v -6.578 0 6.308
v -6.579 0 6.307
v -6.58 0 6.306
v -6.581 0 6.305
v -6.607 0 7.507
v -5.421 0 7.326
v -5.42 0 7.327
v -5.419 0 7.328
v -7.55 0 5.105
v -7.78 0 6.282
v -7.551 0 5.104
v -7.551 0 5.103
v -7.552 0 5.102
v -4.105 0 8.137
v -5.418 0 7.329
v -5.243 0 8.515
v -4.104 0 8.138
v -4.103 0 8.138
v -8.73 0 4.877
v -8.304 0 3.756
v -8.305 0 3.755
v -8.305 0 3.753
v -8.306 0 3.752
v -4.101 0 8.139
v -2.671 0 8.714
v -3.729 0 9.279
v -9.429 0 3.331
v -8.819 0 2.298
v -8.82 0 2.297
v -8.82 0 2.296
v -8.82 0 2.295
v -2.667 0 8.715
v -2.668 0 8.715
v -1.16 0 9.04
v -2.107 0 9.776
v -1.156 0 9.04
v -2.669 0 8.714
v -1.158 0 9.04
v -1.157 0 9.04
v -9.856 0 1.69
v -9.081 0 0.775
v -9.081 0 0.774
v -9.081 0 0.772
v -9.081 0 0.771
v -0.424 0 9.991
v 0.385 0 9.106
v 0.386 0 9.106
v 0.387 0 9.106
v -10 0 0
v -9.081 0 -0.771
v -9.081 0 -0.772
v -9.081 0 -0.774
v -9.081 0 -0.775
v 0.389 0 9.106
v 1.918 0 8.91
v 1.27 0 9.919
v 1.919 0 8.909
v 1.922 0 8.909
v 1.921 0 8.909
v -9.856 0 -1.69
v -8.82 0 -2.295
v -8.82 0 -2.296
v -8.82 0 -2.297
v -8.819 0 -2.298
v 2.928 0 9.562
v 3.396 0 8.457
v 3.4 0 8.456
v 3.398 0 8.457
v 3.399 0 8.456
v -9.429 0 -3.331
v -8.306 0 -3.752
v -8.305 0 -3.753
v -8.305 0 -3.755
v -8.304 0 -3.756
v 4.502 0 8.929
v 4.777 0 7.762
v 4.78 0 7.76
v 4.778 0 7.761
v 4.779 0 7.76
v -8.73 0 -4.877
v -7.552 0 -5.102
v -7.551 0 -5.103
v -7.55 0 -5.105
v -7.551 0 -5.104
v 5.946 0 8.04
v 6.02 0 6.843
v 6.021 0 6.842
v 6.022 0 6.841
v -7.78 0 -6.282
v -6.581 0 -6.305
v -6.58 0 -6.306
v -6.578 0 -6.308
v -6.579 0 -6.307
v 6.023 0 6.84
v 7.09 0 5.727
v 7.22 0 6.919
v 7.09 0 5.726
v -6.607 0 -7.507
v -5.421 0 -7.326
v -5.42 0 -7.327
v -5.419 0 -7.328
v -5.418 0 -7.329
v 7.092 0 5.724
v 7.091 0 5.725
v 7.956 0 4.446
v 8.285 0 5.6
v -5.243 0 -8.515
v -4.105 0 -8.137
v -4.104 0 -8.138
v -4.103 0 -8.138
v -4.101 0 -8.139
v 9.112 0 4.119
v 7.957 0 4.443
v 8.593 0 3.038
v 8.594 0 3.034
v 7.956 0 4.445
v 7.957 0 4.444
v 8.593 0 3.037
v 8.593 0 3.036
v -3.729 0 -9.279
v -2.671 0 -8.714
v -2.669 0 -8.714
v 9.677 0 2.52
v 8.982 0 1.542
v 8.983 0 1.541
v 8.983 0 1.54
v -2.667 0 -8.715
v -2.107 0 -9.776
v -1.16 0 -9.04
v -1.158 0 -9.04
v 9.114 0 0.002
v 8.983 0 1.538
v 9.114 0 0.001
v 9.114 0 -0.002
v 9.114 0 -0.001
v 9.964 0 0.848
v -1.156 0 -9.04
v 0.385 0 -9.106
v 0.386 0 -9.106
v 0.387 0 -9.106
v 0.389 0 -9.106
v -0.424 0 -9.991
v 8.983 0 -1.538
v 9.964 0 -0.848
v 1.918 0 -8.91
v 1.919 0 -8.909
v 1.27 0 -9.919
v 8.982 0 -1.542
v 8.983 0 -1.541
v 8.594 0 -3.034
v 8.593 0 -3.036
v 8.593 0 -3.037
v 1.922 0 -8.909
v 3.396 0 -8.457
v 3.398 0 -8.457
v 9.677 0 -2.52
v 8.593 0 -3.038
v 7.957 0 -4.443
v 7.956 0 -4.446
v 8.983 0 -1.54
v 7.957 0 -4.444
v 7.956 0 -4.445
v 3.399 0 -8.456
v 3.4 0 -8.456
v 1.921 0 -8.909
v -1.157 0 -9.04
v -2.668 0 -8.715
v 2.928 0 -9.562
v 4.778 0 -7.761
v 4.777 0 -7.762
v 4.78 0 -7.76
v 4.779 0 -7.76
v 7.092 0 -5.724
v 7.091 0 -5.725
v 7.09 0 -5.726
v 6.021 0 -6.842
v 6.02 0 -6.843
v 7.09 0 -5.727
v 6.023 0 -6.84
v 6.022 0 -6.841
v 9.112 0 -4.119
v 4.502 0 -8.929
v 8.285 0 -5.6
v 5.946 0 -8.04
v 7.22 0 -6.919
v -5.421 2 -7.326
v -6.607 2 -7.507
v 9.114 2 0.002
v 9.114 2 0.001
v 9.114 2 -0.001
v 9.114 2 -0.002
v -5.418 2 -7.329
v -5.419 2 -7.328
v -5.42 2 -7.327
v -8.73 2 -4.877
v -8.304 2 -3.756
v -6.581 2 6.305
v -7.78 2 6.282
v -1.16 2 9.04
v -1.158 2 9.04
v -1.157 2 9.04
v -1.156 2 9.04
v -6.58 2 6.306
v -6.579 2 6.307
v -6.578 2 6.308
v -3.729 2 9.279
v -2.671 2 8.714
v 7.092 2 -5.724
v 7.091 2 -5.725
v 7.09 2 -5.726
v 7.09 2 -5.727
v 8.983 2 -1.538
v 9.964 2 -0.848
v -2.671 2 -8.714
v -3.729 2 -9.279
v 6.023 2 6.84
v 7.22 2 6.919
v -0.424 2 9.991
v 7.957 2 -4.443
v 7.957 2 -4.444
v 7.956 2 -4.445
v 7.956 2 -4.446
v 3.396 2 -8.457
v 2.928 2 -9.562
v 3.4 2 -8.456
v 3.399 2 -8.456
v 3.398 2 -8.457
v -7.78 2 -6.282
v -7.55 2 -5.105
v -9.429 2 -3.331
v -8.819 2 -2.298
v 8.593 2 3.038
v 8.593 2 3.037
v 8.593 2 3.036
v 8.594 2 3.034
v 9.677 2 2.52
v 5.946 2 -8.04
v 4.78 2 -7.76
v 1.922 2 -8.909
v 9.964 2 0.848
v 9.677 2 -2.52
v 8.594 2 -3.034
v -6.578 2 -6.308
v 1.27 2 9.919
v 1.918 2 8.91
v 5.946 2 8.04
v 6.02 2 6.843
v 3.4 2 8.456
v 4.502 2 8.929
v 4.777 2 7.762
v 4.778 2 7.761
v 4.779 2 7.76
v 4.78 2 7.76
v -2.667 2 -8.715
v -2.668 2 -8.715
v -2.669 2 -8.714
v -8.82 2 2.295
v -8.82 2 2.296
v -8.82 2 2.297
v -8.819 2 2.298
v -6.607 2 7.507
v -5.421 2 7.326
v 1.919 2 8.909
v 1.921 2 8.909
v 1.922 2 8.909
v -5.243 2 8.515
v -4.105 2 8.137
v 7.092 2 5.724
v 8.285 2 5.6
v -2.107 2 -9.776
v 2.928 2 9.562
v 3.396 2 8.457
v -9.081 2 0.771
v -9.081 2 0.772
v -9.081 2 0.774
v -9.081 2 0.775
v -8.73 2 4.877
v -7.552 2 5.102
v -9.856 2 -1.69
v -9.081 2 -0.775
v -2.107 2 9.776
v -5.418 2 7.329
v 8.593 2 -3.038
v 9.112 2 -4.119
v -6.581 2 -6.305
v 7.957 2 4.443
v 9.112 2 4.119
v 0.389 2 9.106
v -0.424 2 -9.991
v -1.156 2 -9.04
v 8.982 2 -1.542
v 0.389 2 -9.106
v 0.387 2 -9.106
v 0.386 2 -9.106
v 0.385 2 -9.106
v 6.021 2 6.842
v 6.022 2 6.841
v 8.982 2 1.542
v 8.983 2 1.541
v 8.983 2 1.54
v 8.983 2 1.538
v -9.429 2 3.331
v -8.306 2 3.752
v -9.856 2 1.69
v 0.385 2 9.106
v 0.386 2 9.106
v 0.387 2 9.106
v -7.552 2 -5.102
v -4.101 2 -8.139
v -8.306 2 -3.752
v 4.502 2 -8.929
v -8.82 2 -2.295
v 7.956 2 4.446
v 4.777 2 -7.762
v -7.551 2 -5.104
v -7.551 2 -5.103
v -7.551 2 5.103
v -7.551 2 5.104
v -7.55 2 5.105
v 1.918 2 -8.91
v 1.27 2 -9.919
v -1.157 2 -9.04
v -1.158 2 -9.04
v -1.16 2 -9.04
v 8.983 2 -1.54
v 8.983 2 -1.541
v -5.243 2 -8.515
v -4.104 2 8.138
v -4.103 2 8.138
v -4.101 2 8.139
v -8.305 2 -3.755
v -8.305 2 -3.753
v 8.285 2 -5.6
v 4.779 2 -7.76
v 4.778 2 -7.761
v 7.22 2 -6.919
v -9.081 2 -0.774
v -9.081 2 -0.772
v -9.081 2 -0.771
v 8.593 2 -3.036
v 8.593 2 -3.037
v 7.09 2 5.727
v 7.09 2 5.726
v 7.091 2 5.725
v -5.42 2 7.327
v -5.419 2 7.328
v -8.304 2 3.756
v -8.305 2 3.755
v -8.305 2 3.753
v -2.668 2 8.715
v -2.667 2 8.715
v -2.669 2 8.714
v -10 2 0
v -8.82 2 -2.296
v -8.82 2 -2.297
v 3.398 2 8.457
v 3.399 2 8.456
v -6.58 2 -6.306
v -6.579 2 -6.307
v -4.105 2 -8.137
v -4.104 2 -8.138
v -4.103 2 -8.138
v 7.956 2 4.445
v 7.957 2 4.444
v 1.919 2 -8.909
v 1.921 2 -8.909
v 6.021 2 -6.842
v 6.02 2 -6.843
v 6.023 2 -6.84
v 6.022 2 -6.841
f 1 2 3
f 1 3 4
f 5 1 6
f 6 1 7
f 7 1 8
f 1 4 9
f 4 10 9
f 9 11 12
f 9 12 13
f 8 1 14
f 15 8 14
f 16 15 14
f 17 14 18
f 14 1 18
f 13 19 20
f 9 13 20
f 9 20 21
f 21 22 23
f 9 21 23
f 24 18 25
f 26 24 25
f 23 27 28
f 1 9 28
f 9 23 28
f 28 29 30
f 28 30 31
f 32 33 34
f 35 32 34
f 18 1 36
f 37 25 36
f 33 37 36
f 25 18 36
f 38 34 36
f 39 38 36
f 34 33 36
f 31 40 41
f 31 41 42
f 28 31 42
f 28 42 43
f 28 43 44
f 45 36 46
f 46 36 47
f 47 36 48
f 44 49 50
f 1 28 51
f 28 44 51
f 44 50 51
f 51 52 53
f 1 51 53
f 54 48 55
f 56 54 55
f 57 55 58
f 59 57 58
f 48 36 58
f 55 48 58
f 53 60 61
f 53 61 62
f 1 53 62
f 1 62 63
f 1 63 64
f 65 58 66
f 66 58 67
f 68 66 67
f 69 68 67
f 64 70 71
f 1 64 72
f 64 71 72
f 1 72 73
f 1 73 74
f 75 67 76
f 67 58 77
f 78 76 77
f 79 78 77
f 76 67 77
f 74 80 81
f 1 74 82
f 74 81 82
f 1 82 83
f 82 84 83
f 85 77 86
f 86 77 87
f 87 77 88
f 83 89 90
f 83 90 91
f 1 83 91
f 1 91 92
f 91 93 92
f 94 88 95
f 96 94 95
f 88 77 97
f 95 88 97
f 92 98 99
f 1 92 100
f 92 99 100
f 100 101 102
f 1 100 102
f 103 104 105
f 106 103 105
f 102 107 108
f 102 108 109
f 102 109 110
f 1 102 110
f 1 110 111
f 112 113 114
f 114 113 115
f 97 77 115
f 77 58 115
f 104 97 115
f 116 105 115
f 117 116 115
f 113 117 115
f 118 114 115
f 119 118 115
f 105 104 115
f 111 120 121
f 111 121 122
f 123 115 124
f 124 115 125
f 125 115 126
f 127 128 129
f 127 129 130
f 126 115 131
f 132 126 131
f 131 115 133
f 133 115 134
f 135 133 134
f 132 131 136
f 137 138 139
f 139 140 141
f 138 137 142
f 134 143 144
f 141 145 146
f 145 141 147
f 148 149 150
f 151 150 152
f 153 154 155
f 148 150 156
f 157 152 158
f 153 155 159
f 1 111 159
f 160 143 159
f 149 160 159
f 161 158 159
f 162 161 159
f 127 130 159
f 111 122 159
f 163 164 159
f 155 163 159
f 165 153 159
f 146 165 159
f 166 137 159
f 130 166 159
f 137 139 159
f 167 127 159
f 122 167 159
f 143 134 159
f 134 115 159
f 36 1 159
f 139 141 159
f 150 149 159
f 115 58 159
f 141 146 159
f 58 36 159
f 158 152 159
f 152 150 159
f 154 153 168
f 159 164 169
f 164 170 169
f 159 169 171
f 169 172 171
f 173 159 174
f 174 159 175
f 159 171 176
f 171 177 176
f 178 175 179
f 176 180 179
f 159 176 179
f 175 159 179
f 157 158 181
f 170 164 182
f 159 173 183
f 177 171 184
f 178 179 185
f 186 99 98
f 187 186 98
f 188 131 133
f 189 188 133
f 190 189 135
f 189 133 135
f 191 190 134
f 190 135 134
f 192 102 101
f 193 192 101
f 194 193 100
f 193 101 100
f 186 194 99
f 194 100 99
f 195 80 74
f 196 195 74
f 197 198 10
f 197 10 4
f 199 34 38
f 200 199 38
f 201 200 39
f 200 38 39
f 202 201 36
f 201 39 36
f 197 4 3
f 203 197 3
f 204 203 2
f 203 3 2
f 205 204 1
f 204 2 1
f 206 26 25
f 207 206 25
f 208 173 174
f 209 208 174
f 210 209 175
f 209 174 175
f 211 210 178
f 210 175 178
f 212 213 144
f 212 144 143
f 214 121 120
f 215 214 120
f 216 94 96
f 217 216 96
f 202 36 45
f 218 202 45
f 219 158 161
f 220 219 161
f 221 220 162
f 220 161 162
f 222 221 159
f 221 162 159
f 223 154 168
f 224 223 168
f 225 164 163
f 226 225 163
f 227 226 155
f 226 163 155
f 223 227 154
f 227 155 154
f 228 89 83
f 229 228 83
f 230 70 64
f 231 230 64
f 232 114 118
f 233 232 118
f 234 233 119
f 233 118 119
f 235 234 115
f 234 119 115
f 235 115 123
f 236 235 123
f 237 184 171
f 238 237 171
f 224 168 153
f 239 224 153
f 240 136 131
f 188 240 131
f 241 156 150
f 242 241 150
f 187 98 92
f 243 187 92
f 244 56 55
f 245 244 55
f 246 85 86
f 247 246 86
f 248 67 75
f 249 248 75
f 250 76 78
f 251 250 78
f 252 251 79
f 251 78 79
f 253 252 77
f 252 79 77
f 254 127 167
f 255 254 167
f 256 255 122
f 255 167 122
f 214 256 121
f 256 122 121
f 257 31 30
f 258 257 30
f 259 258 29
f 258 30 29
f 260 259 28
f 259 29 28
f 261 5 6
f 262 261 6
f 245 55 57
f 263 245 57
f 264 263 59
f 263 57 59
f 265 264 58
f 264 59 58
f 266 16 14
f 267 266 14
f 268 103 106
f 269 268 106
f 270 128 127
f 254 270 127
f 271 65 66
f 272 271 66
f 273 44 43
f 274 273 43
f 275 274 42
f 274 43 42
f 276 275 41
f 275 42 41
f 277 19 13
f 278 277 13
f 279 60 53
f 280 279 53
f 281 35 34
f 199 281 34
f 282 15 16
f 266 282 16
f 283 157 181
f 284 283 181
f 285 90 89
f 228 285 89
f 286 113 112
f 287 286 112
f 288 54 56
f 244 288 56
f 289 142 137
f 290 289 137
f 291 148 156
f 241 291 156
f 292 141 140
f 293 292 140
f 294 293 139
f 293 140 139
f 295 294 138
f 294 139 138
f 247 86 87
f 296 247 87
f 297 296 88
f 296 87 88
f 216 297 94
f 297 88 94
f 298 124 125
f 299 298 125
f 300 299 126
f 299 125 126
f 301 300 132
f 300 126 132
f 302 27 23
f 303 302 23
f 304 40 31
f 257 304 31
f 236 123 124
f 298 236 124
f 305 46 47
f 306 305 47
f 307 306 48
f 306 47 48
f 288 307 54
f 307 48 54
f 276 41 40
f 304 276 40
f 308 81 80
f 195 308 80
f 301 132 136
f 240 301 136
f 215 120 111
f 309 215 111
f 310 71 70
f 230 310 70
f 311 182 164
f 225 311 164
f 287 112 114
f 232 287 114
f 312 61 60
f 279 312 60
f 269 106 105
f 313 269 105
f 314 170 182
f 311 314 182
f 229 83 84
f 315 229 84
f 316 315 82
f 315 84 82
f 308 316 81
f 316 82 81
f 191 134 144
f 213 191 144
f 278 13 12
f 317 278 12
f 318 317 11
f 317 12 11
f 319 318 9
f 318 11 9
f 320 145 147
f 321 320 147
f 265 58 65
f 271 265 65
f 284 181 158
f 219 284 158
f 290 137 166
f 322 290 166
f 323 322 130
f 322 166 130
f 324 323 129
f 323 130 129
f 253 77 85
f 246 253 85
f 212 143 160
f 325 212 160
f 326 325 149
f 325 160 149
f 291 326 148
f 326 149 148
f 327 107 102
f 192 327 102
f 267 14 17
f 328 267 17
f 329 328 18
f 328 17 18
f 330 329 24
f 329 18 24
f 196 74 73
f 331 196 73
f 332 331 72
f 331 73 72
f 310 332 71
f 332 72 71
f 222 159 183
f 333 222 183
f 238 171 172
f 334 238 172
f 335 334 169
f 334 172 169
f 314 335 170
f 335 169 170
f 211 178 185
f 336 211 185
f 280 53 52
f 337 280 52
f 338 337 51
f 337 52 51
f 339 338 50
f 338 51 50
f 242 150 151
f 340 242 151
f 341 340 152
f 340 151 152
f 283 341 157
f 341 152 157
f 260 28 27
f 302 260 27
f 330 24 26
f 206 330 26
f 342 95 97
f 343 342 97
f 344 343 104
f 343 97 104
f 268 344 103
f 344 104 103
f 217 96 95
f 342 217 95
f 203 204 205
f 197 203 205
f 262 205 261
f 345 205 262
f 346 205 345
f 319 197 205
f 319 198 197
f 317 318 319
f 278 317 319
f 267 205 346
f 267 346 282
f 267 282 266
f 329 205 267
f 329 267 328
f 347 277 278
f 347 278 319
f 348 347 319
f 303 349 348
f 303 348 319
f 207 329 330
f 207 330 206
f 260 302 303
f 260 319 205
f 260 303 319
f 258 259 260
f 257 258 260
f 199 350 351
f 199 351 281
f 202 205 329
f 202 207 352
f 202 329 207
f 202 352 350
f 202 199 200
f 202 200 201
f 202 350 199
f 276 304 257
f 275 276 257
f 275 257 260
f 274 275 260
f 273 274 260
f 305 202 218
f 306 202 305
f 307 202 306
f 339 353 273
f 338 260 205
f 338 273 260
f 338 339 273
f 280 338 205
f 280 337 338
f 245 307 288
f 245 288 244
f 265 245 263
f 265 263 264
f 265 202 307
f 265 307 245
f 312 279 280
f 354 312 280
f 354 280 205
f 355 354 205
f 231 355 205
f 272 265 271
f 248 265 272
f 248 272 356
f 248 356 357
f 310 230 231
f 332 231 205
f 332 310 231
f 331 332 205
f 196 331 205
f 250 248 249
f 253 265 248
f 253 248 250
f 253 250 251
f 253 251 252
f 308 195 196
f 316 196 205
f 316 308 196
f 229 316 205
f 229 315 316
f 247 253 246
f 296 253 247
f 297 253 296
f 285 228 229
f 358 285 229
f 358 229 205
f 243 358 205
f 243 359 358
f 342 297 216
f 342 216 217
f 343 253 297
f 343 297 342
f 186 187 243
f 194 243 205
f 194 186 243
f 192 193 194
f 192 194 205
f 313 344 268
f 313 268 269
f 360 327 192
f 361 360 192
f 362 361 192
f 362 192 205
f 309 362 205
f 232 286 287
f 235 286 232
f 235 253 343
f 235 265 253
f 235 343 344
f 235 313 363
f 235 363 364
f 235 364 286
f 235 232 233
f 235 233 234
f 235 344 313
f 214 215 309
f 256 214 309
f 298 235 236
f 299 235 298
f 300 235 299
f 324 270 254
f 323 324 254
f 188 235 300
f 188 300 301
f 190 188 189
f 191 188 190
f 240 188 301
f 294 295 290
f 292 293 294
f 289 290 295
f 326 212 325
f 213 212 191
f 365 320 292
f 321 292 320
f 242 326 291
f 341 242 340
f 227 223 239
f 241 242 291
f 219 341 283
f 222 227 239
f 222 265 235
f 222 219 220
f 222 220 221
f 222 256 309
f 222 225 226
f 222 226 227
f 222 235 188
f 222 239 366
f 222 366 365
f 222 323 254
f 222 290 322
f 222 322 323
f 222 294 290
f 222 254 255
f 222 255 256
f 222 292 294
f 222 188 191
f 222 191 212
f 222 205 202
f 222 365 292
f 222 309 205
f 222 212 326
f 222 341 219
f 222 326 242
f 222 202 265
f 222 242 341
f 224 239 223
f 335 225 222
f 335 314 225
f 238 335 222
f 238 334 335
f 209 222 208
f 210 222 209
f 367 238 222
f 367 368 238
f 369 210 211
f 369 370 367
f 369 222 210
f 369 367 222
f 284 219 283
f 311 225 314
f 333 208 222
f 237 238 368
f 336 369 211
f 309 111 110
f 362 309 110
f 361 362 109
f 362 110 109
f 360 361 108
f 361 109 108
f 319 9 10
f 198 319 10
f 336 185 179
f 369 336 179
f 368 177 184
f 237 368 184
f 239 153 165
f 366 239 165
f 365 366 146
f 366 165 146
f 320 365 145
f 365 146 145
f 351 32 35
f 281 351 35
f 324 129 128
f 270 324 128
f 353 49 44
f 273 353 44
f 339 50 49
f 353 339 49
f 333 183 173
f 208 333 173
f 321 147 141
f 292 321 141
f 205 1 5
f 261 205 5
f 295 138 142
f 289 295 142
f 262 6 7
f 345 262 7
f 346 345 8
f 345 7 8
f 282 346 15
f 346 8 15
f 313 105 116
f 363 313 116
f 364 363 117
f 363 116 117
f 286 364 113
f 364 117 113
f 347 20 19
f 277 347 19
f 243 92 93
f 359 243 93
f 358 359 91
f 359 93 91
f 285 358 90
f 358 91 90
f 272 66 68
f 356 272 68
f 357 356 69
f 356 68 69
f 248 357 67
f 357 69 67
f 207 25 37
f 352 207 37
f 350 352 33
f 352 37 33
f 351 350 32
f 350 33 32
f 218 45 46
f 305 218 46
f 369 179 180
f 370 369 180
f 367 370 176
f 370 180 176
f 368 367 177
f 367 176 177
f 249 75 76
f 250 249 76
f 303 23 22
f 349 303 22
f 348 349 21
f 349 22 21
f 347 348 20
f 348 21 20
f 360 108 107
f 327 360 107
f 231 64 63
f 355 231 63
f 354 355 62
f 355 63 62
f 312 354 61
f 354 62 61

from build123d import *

# Parameters (mm, degrees)
BOSS_EXTRUDE2_DEPTH    = 2
BOSS_EXTRUDE2_2_DEPTH  = 2
BOSS_EXTRUDE2_3_DEPTH  = 2
BOSS_EXTRUDE2_4_DEPTH  = 2
BOSS_EXTRUDE2_5_DEPTH  = 2
BOSS_EXTRUDE2_6_DEPTH  = 2
BOSS_EXTRUDE2_7_DEPTH  = 2
BOSS_EXTRUDE2_8_DEPTH  = 2
BOSS_EXTRUDE2_9_DEPTH  = 2
BOSS_EXTRUDE2_10_DEPTH = 2
BOSS_EXTRUDE2_11_DEPTH = 2
BOSS_EXTRUDE2_12_DEPTH = 2
BOSS_EXTRUDE2_13_DEPTH = 2
BOSS_EXTRUDE2_14_DEPTH = 2
BOSS_EXTRUDE2_15_DEPTH = 2
BOSS_EXTRUDE2_16_DEPTH = 2
BOSS_EXTRUDE2_17_DEPTH = 2
BOSS_EXTRUDE2_18_DEPTH = 2
BOSS_EXTRUDE2_19_DEPTH = 2
BOSS_EXTRUDE2_20_DEPTH = 2
BOSS_EXTRUDE2_21_DEPTH = 2
BOSS_EXTRUDE2_22_DEPTH = 2
BOSS_EXTRUDE2_23_DEPTH = 2
BOSS_EXTRUDE2_24_DEPTH = 2
BOSS_EXTRUDE2_25_DEPTH = 2
BOSS_EXTRUDE2_26_DEPTH = 2
BOSS_EXTRUDE2_27_DEPTH = 2
BOSS_EXTRUDE2_28_DEPTH = 2
BOSS_EXTRUDE2_29_DEPTH = 2
BOSS_EXTRUDE2_30_DEPTH = 2
BOSS_EXTRUDE2_31_DEPTH = 2
BOSS_EXTRUDE2_32_DEPTH = 2
BOSS_EXTRUDE2_33_DEPTH = 2
BOSS_EXTRUDE2_34_DEPTH = 2
BOSS_EXTRUDE2_35_DEPTH = 2
BOSS_EXTRUDE2_36_DEPTH = 2
BOSS_EXTRUDE2_37_DEPTH = 2
SKETCH1_7_R            = 9.11382877
BOSS_EXTRUDE3_DEPTH    = 2


with BuildPart() as part:
    # Sketch1 → Boss-Extrude2 (new body)
    with BuildSketch(Plane(origin=(0, 0, 0), x_dir=(1, 0, 0), z_dir=(0, 1, 0))):
        with BuildLine():
            ThreePointArc((0.384889844, -9.105697923), (-0.386801859, -9.105616902), (-1.155720405, -9.040253602))
            Line((-1.155720405, -9.040253602), (-0.424412032, -9.990989662))
            Line((-0.424412032, -9.990989662), (0.384889844, -9.105697923))
        make_face()
    extrude(amount=BOSS_EXTRUDE2_DEPTH)



with BuildPart() as body_2:
    # Sketch1 → Boss-Extrude2 2 (new body)
    with BuildSketch(Plane(origin=(0, 0, 0), x_dir=(1, 0, 0), z_dir=(0, 1, 0))):
        with BuildLine():
            ThreePointArc((1.918223973, -8.909674048), (1.15761866, -9.040010724), (0.388713856, -9.105535481))
            Line((0.388713856, -9.105535481), (1.270178197, -9.919004353))
            Line((1.270178197, -9.919004353), (1.918223973, -8.909674048))
        make_face()
    extrude(amount=BOSS_EXTRUDE2_2_DEPTH)


with BuildPart() as body_3:
    # Sketch1 → Boss-Extrude2 3 (new body)
    with BuildSketch(Plane(origin=(0, 0, 0), x_dir=(1, 0, 0), z_dir=(0, 1, 0))):
        with BuildLine():
            ThreePointArc((3.39637429, -8.457335073), (2.668736597, -8.714339896), (1.921965527, -8.908867681))
            Line((1.921965527, -8.908867681), (2.928227713, -9.561667347))
            Line((2.928227713, -9.561667347), (3.39637429, -8.457335073))
        make_face()
    extrude(amount=BOSS_EXTRUDE2_3_DEPTH)


with BuildPart() as body_4:
    # Sketch1 → Boss-Extrude2 4 (new body)
    with BuildSketch(Plane(origin=(0, 0, 0), x_dir=(1, 0, 0), z_dir=(0, 1, 0))):
        with BuildLine():
            ThreePointArc((4.776817103, -7.761693966), (4.103079842, -8.137973376), (3.399925749, -8.455907979))
            Line((3.399925749, -8.455907979), (4.502037448, -8.929258581))
            Line((4.502037448, -8.929258581), (4.776817103, -7.761693966))
        make_face()
    extrude(amount=BOSS_EXTRUDE2_4_DEPTH)


with BuildPart() as body_5:
    # Sketch1 → Boss-Extrude2 5 (new body)
    with BuildSketch(Plane(origin=(0, 0, 0), x_dir=(1, 0, 0), z_dir=(0, 1, 0))):
        with BuildLine():
            ThreePointArc((6.019839585, -6.842763055), (5.41938495, -7.327492178), (4.780076297, -7.7596872))
            Line((4.780076297, -7.7596872), (5.946331763, -8.039971304))
            Line((5.946331763, -8.039971304), (6.019839585, -6.842763055))
        make_face()
    extrude(amount=BOSS_EXTRUDE2_5_DEPTH)


with BuildPart() as body_6:
    # Sketch1 → Boss-Extrude2 6 (new body)
    with BuildSketch(Plane(origin=(0, 0, 0), x_dir=(1, 0, 0), z_dir=(0, 1, 0))):
        with BuildLine():
            ThreePointArc((7.089682242, -5.72697831), (6.57978422, -6.306212371), (6.022712753, -6.840234349))
            Line((6.022712753, -6.840234349), (7.21956094, -6.91938869))
            Line((7.21956094, -6.91938869), (7.089682242, -5.72697831))
        make_face()
    extrude(amount=BOSS_EXTRUDE2_6_DEPTH)


with BuildPart() as body_7:
    # Sketch1 → Boss-Extrude2 7 (new body)
    with BuildSketch(Plane(origin=(0, 0, 0), x_dir=(1, 0, 0), z_dir=(0, 1, 0))):
        with BuildLine():
            ThreePointArc((7.955567649, -4.446438825), (7.550895078, -5.103514316), (7.092086729, -5.724000409))
            Line((7.092086729, -5.724000409), (8.285096492, -5.599747861))
            Line((8.285096492, -5.599747861), (7.955567649, -4.446438825))
        make_face()
    extrude(amount=BOSS_EXTRUDE2_7_DEPTH)


with BuildPart() as body_8:
    # Sketch1 → Boss-Extrude2 8 (new body)
    with BuildSketch(Plane(origin=(0, 0, 0), x_dir=(1, 0, 0), z_dir=(0, 1, 0))):
        with BuildLine():
            ThreePointArc((8.59258586, -3.037983392), (8.304780432, -3.753997447), (7.957434282, -4.443097399))
            Line((7.957434282, -4.443097399), (9.112284904, -4.119012482))
            Line((9.112284904, -4.119012482), (8.59258586, -3.037983392))
        make_face()
    extrude(amount=BOSS_EXTRUDE2_8_DEPTH)


with BuildPart() as body_9:
    # Sketch1 → Boss-Extrude2 9 (new body)
    with BuildSketch(Plane(origin=(0, 0, 0), x_dir=(1, 0, 0), z_dir=(0, 1, 0))):
        with BuildLine():
            ThreePointArc((8.98241102, -1.542130707), (8.819752374, -2.296484905), (8.593860939, -3.034374566))
            Line((8.593860939, -3.034374566), (9.677329469, -2.519780614))
            Line((9.677329469, -2.519780614), (8.98241102, -1.542130707))
        make_face()
    extrude(amount=BOSS_EXTRUDE2_9_DEPTH)


with BuildPart() as body_10:
    # Sketch1 → Boss-Extrude2 10 (new body)
    with BuildSketch(Plane(origin=(0, 0, 0), x_dir=(1, 0, 0), z_dir=(0, 1, 0))):
        with BuildLine():
            ThreePointArc((9.113828569, -0.00191373), (9.080996098, -0.772906674), (8.983057864, -1.538358302))
            Line((8.983057864, -1.538358302), (9.963974885, -0.848059245))
            Line((9.963974885, -0.848059245), (9.113828569, -0.00191373))
        make_face()
    extrude(amount=BOSS_EXTRUDE2_10_DEPTH)


with BuildPart() as body_11:
    # Sketch1 → Boss-Extrude2 11 (new body)
    with BuildSketch(Plane(origin=(0, 0, 0), x_dir=(1, 0, 0), z_dir=(0, 1, 0))):
        with BuildLine():
            Line((9.963974885, 0.848059245), (8.983057864, 1.538358302))
            ThreePointArc((8.983057864, 1.538358302), (9.080996098, 0.772906674), (9.113828569, 0.00191373))
            Line((9.113828569, 0.00191373), (9.963974885, 0.848059245))
        make_face()
    extrude(amount=BOSS_EXTRUDE2_11_DEPTH)


with BuildPart() as body_12:
    # Sketch1 → Boss-Extrude2 12 (new body)
    with BuildSketch(Plane(origin=(0, 0, 0), x_dir=(1, 0, 0), z_dir=(0, 1, 0))):
        with BuildLine():
            Line((9.677329469, 2.519780614), (8.593860939, 3.034374566))
            ThreePointArc((8.593860939, 3.034374566), (8.819752374, 2.296484905), (8.98241102, 1.542130707))
            Line((8.98241102, 1.542130707), (9.677329469, 2.519780614))
        make_face()
    extrude(amount=BOSS_EXTRUDE2_12_DEPTH)


with BuildPart() as body_13:
    # Sketch1 → Boss-Extrude2 13 (new body)
    with BuildSketch(Plane(origin=(0, 0, 0), x_dir=(1, 0, 0), z_dir=(0, 1, 0))):
        with BuildLine():
            Line((9.112284904, 4.119012482), (7.957434282, 4.443097399))
            ThreePointArc((7.957434282, 4.443097399), (8.304780432, 3.753997447), (8.59258586, 3.037983392))
            Line((8.59258586, 3.037983392), (9.112284904, 4.119012482))
        make_face()
    extrude(amount=BOSS_EXTRUDE2_13_DEPTH)


with BuildPart() as body_14:
    # Sketch1 → Boss-Extrude2 14 (new body)
    with BuildSketch(Plane(origin=(0, 0, 0), x_dir=(1, 0, 0), z_dir=(0, 1, 0))):
        with BuildLine():
            Line((8.285096492, 5.599747861), (7.092086729, 5.724000409))
            ThreePointArc((7.092086729, 5.724000409), (7.550895078, 5.103514316), (7.955567649, 4.446438825))
            Line((7.955567649, 4.446438825), (8.285096492, 5.599747861))
        make_face()
    extrude(amount=BOSS_EXTRUDE2_14_DEPTH)


with BuildPart() as body_15:
    # Sketch1 → Boss-Extrude2 15 (new body)
    with BuildSketch(Plane(origin=(0, 0, 0), x_dir=(1, 0, 0), z_dir=(0, 1, 0))):
        with BuildLine():
            Line((7.21956094, 6.91938869), (6.022712753, 6.840234349))
            ThreePointArc((6.022712753, 6.840234349), (6.57978422, 6.306212371), (7.089682242, 5.72697831))
            Line((7.089682242, 5.72697831), (7.21956094, 6.91938869))
        make_face()
    extrude(amount=BOSS_EXTRUDE2_15_DEPTH)


with BuildPart() as body_16:
    # Sketch1 → Boss-Extrude2 16 (new body)
    with BuildSketch(Plane(origin=(0, 0, 0), x_dir=(1, 0, 0), z_dir=(0, 1, 0))):
        with BuildLine():
            Line((5.946331763, 8.039971304), (4.780076297, 7.7596872))
            ThreePointArc((4.780076297, 7.7596872), (5.41938495, 7.327492178), (6.019839585, 6.842763055))
            Line((6.019839585, 6.842763055), (5.946331763, 8.039971304))
        make_face()
    extrude(amount=BOSS_EXTRUDE2_16_DEPTH)


with BuildPart() as body_17:
    # Sketch1 → Boss-Extrude2 17 (new body)
    with BuildSketch(Plane(origin=(0, 0, 0), x_dir=(1, 0, 0), z_dir=(0, 1, 0))):
        with BuildLine():
            Line((4.502037448, 8.929258581), (3.399925749, 8.455907979))
            ThreePointArc((3.399925749, 8.455907979), (4.103079842, 8.137973376), (4.776817103, 7.761693966))
            Line((4.776817103, 7.761693966), (4.502037448, 8.929258581))
        make_face()
    extrude(amount=BOSS_EXTRUDE2_17_DEPTH)


with BuildPart() as body_18:
    # Sketch1 → Boss-Extrude2 18 (new body)
    with BuildSketch(Plane(origin=(0, 0, 0), x_dir=(1, 0, 0), z_dir=(0, 1, 0))):
        with BuildLine():
            Line((2.928227713, 9.561667347), (1.921965527, 8.908867681))
            ThreePointArc((1.921965527, 8.908867681), (2.668736597, 8.714339896), (3.39637429, 8.457335073))
            Line((3.39637429, 8.457335073), (2.928227713, 9.561667347))
        make_face()
    extrude(amount=BOSS_EXTRUDE2_18_DEPTH)


with BuildPart() as body_19:
    # Sketch1 → Boss-Extrude2 19 (new body)
    with BuildSketch(Plane(origin=(0, 0, 0), x_dir=(1, 0, 0), z_dir=(0, 1, 0))):
        with BuildLine():
            Line((1.270178197, 9.919004353), (0.388713856, 9.105535481))
            ThreePointArc((0.388713856, 9.105535481), (1.15761866, 9.040010724), (1.918223973, 8.909674048))
            Line((1.918223973, 8.909674048), (1.270178197, 9.919004353))
        make_face()
    extrude(amount=BOSS_EXTRUDE2_19_DEPTH)


with BuildPart() as body_20:
    # Sketch1 → Boss-Extrude2 20 (new body)
    with BuildSketch(Plane(origin=(0, 0, 0), x_dir=(1, 0, 0), z_dir=(0, 1, 0))):
        with BuildLine():
            Line((-0.424412032, 9.990989662), (-1.155720405, 9.040253602))
            ThreePointArc((-1.155720405, 9.040253602), (-0.386801859, 9.105616902), (0.384889844, 9.105697923))
            Line((0.384889844, 9.105697923), (-0.424412032, 9.990989662))
        make_face()
    extrude(amount=BOSS_EXTRUDE2_20_DEPTH)


with BuildPart() as body_21:
    # Sketch1 → Boss-Extrude2 21 (new body)
    with BuildSketch(Plane(origin=(0, 0, 0), x_dir=(1, 0, 0), z_dir=(0, 1, 0))):
        with BuildLine():
            Line((-2.1067927, 9.775552389), (-2.666906693, 8.714900088))
            ThreePointArc((-2.666906693, 8.714900088), (-1.920094792, 8.909271061), (-1.159516864, 9.039767447))
            Line((-1.159516864, 9.039767447), (-2.1067927, 9.775552389))
        make_face()
    extrude(amount=BOSS_EXTRUDE2_21_DEPTH)


with BuildPart() as body_22:
    # Sketch1 → Boss-Extrude2 22 (new body)
    with BuildSketch(Plane(origin=(0, 0, 0), x_dir=(1, 0, 0), z_dir=(0, 1, 0))):
        with BuildLine():
            Line((-3.728564778, 9.278890273), (-4.101370932, 8.138834765))
            ThreePointArc((-4.101370932, 8.138834765), (-3.398150094, 8.456621712), (-2.670566384, 8.71377932))
            Line((-2.670566384, 8.71377932), (-3.728564778, 9.278890273))
        make_face()
    extrude(amount=BOSS_EXTRUDE2_22_DEPTH)


with BuildPart() as body_23:
    # Sketch1 → Boss-Extrude2 23 (new body)
    with BuildSketch(Plane(origin=(0, 0, 0), x_dir=(1, 0, 0), z_dir=(0, 1, 0))):
        with BuildLine():
            Line((-5.243072836, 8.515291377), (-5.417846197, 7.328629984))
            ThreePointArc((-5.417846197, 7.328629984), (-4.778446805, 7.760690754), (-4.104788571, 8.137111628))
            Line((-4.104788571, 8.137111628), (-5.243072836, 8.515291377))
        make_face()
    extrude(amount=BOSS_EXTRUDE2_23_DEPTH)


with BuildPart() as body_24:
    # Sketch1 → Boss-Extrude2 24 (new body)
    with BuildSketch(Plane(origin=(0, 0, 0), x_dir=(1, 0, 0), z_dir=(0, 1, 0))):
        with BuildLine():
            Line((-6.606747234, 7.506723053), (-6.57845989, 6.307593861))
            ThreePointArc((-6.57845989, 6.307593861), (-6.021276302, 6.841498853), (-5.420923464, 7.326354049))
            Line((-5.420923464, 7.326354049), (-6.606747234, 7.506723053))
        make_face()
    extrude(amount=BOSS_EXTRUDE2_24_DEPTH)


with BuildPart() as body_25:
    # Sketch1 → Boss-Extrude2 25 (new body)
    with BuildSketch(Plane(origin=(0, 0, 0), x_dir=(1, 0, 0), z_dir=(0, 1, 0))):
        with BuildLine():
            Line((-7.780357543, 6.282199973), (-7.54982327, 5.105099748))
            ThreePointArc((-7.54982327, 5.105099748), (-7.090884642, 5.725489485), (-6.581108259, 6.304830603))
            Line((-6.581108259, 6.304830603), (-7.780357543, 6.282199973))
        make_face()
    extrude(amount=BOSS_EXTRUDE2_25_DEPTH)


with BuildPart() as body_26:
    # Sketch1 → Boss-Extrude2 26 (new body)
    with BuildSketch(Plane(origin=(0, 0, 0), x_dir=(1, 0, 0), z_dir=(0, 1, 0))):
        with BuildLine():
            Line((-8.730141132, 4.876949438), (-8.303991981, 3.755741209))
            ThreePointArc((-8.303991981, 3.755741209), (-7.956501141, 4.44476821), (-7.551966552, 5.10192866))
            Line((-7.551966552, 5.10192866), (-8.730141132, 4.876949438))
        make_face()
    extrude(amount=BOSS_EXTRUDE2_26_DEPTH)


with BuildPart() as body_27:
    # Sketch1 → Boss-Extrude2 27 (new body)
    with BuildSketch(Plane(origin=(0, 0, 0), x_dir=(1, 0, 0), z_dir=(0, 1, 0))):
        with BuildLine():
            Line((-9.428774455, 3.331397947), (-8.819269961, 2.298336834))
            ThreePointArc((-8.819269961, 2.298336834), (-8.593223589, 3.036179046), (-8.305568517, 3.752253518))
            Line((-8.305568517, 3.752253518), (-9.428774455, 3.331397947))
        make_face()
    extrude(amount=BOSS_EXTRUDE2_27_DEPTH)


with BuildPart() as body_28:
    # Sketch1 → Boss-Extrude2 28 (new body)
    with BuildSketch(Plane(origin=(0, 0, 0), x_dir=(1, 0, 0), z_dir=(0, 1, 0))):
        with BuildLine():
            Line((-9.856159103, 1.690008203), (-9.080833602, 0.774813493))
            ThreePointArc((-9.080833602, 0.774813493), (-8.98273464, 1.540244538), (-8.820234397, 2.294632875))
            Line((-8.820234397, 2.294632875), (-9.856159103, 1.690008203))
        make_face()
    extrude(amount=BOSS_EXTRUDE2_28_DEPTH)


with BuildPart() as body_29:
    # Sketch1 → Boss-Extrude2 29 (new body)
    with BuildSketch(Plane(origin=(0, 0, 0), x_dir=(1, 0, 0), z_dir=(0, 1, 0))):
        with BuildLine():
            Line((-9.081158193, 0.770999821), (-10, 0))
            Line((-10, 0), (-9.081158193, -0.770999821))
            ThreePointArc((-9.081158193, -0.770999821), (-9.11382877, 0), (-9.081158193, 0.770999821))
        make_face()
    extrude(amount=BOSS_EXTRUDE2_29_DEPTH)


with BuildPart() as body_30:
    # Sketch1 → Boss-Extrude2 30 (new body)
    with BuildSketch(Plane(origin=(0, 0, 0), x_dir=(1, 0, 0), z_dir=(0, 1, 0))):
        with BuildLine():
            ThreePointArc((-8.820234397, -2.294632875), (-8.98273464, -1.540244538), (-9.080833602, -0.774813493))
            Line((-9.080833602, -0.774813493), (-9.856159103, -1.690008203))
            Line((-9.856159103, -1.690008203), (-8.820234397, -2.294632875))
        make_face()
    extrude(amount=BOSS_EXTRUDE2_30_DEPTH)


with BuildPart() as body_31:
    # Sketch1 → Boss-Extrude2 31 (new body)
    with BuildSketch(Plane(origin=(0, 0, 0), x_dir=(1, 0, 0), z_dir=(0, 1, 0))):
        with BuildLine():
            ThreePointArc((-8.305568517, -3.752253518), (-8.593223589, -3.036179046), (-8.819269961, -2.298336834))
            Line((-8.819269961, -2.298336834), (-9.428774455, -3.331397947))
            Line((-9.428774455, -3.331397947), (-8.305568517, -3.752253518))
        make_face()
    extrude(amount=BOSS_EXTRUDE2_31_DEPTH)


with BuildPart() as body_32:
    # Sketch1 → Boss-Extrude2 32 (new body)
    with BuildSketch(Plane(origin=(0, 0, 0), x_dir=(1, 0, 0), z_dir=(0, 1, 0))):
        with BuildLine():
            ThreePointArc((-7.551966552, -5.10192866), (-7.956501141, -4.44476821), (-8.303991981, -3.755741209))
            Line((-8.303991981, -3.755741209), (-8.730141132, -4.876949438))
            Line((-8.730141132, -4.876949438), (-7.551966552, -5.10192866))
        make_face()
    extrude(amount=BOSS_EXTRUDE2_32_DEPTH)


with BuildPart() as body_33:
    # Sketch1 → Boss-Extrude2 33 (new body)
    with BuildSketch(Plane(origin=(0, 0, 0), x_dir=(1, 0, 0), z_dir=(0, 1, 0))):
        with BuildLine():
            ThreePointArc((-6.581108259, -6.304830603), (-7.090884642, -5.725489485), (-7.54982327, -5.105099748))
            Line((-7.54982327, -5.105099748), (-7.780357543, -6.282199973))
            Line((-7.780357543, -6.282199973), (-6.581108259, -6.304830603))
        make_face()
    extrude(amount=BOSS_EXTRUDE2_33_DEPTH)


with BuildPart() as body_34:
    # Sketch1 → Boss-Extrude2 34 (new body)
    with BuildSketch(Plane(origin=(0, 0, 0), x_dir=(1, 0, 0), z_dir=(0, 1, 0))):
        with BuildLine():
            ThreePointArc((-5.420923464, -7.326354049), (-6.021276302, -6.841498853), (-6.57845989, -6.307593861))
            Line((-6.57845989, -6.307593861), (-6.606747234, -7.506723053))
            Line((-6.606747234, -7.506723053), (-5.420923464, -7.326354049))
        make_face()
    extrude(amount=BOSS_EXTRUDE2_34_DEPTH)


with BuildPart() as body_35:
    # Sketch1 → Boss-Extrude2 35 (new body)
    with BuildSketch(Plane(origin=(0, 0, 0), x_dir=(1, 0, 0), z_dir=(0, 1, 0))):
        with BuildLine():
            ThreePointArc((-4.104788571, -8.137111628), (-4.778446805, -7.760690754), (-5.417846197, -7.328629984))
            Line((-5.417846197, -7.328629984), (-5.243072836, -8.515291377))
            Line((-5.243072836, -8.515291377), (-4.104788571, -8.137111628))
        make_face()
    extrude(amount=BOSS_EXTRUDE2_35_DEPTH)


with BuildPart() as body_36:
    # Sketch1 → Boss-Extrude2 36 (new body)
    with BuildSketch(Plane(origin=(0, 0, 0), x_dir=(1, 0, 0), z_dir=(0, 1, 0))):
        with BuildLine():
            ThreePointArc((-2.670566384, -8.71377932), (-3.398150094, -8.456621712), (-4.101370932, -8.138834765))
            Line((-4.101370932, -8.138834765), (-3.728564778, -9.278890273))
            Line((-3.728564778, -9.278890273), (-2.670566384, -8.71377932))
        make_face()
    extrude(amount=BOSS_EXTRUDE2_36_DEPTH)


with BuildPart() as body_37:
    # Sketch1 → Boss-Extrude2 37 (new body)
    with BuildSketch(Plane(origin=(0, 0, 0), x_dir=(1, 0, 0), z_dir=(0, 1, 0))):
        with BuildLine():
            ThreePointArc((-1.159516864, -9.039767447), (-1.920094792, -8.909271061), (-2.666906693, -8.714900088))
            Line((-2.666906693, -8.714900088), (-2.1067927, -9.775552389))
            Line((-2.1067927, -9.775552389), (-1.159516864, -9.039767447))
        make_face()
    extrude(amount=BOSS_EXTRUDE2_37_DEPTH)


with BuildPart() as part_1:
    add(part.part)

    add(body_2.part)  # Boss-Extrude3 merges body 2

    add(body_3.part)  # Boss-Extrude3 merges body 3

    add(body_4.part)  # Boss-Extrude3 merges body 4

    add(body_5.part)  # Boss-Extrude3 merges body 5

    add(body_6.part)  # Boss-Extrude3 merges body 6

    add(body_7.part)  # Boss-Extrude3 merges body 7

    add(body_8.part)  # Boss-Extrude3 merges body 8

    add(body_9.part)  # Boss-Extrude3 merges body 9

    add(body_10.part)  # Boss-Extrude3 merges body 10

    add(body_11.part)  # Boss-Extrude3 merges body 11

    add(body_12.part)  # Boss-Extrude3 merges body 12

    add(body_13.part)  # Boss-Extrude3 merges body 13

    add(body_14.part)  # Boss-Extrude3 merges body 14

    add(body_15.part)  # Boss-Extrude3 merges body 15

    add(body_16.part)  # Boss-Extrude3 merges body 16

    add(body_17.part)  # Boss-Extrude3 merges body 17

    add(body_18.part)  # Boss-Extrude3 merges body 18

    add(body_19.part)  # Boss-Extrude3 merges body 19

    add(body_20.part)  # Boss-Extrude3 merges body 20

    add(body_21.part)  # Boss-Extrude3 merges body 21

    add(body_22.part)  # Boss-Extrude3 merges body 22

    add(body_23.part)  # Boss-Extrude3 merges body 23

    add(body_24.part)  # Boss-Extrude3 merges body 24

    add(body_25.part)  # Boss-Extrude3 merges body 25

    add(body_26.part)  # Boss-Extrude3 merges body 26

    add(body_27.part)  # Boss-Extrude3 merges body 27

    add(body_28.part)  # Boss-Extrude3 merges body 28

    add(body_29.part)  # Boss-Extrude3 merges body 29

    add(body_30.part)  # Boss-Extrude3 merges body 30

    add(body_31.part)  # Boss-Extrude3 merges body 31

    add(body_32.part)  # Boss-Extrude3 merges body 32

    add(body_33.part)  # Boss-Extrude3 merges body 33

    add(body_34.part)  # Boss-Extrude3 merges body 34

    add(body_35.part)  # Boss-Extrude3 merges body 35

    add(body_36.part)  # Boss-Extrude3 merges body 36

    add(body_37.part)  # Boss-Extrude3 merges body 37
    # Sketch1_7 → Boss-Extrude3 (add)
    with BuildSketch(Plane(origin=(0, 0, 0), x_dir=(1, 0, 0), z_dir=(0, 1, 0))):
        Circle(SKETCH1_7_R)
    extrude(amount=BOSS_EXTRUDE3_DEPTH)


solid = part_1.part
